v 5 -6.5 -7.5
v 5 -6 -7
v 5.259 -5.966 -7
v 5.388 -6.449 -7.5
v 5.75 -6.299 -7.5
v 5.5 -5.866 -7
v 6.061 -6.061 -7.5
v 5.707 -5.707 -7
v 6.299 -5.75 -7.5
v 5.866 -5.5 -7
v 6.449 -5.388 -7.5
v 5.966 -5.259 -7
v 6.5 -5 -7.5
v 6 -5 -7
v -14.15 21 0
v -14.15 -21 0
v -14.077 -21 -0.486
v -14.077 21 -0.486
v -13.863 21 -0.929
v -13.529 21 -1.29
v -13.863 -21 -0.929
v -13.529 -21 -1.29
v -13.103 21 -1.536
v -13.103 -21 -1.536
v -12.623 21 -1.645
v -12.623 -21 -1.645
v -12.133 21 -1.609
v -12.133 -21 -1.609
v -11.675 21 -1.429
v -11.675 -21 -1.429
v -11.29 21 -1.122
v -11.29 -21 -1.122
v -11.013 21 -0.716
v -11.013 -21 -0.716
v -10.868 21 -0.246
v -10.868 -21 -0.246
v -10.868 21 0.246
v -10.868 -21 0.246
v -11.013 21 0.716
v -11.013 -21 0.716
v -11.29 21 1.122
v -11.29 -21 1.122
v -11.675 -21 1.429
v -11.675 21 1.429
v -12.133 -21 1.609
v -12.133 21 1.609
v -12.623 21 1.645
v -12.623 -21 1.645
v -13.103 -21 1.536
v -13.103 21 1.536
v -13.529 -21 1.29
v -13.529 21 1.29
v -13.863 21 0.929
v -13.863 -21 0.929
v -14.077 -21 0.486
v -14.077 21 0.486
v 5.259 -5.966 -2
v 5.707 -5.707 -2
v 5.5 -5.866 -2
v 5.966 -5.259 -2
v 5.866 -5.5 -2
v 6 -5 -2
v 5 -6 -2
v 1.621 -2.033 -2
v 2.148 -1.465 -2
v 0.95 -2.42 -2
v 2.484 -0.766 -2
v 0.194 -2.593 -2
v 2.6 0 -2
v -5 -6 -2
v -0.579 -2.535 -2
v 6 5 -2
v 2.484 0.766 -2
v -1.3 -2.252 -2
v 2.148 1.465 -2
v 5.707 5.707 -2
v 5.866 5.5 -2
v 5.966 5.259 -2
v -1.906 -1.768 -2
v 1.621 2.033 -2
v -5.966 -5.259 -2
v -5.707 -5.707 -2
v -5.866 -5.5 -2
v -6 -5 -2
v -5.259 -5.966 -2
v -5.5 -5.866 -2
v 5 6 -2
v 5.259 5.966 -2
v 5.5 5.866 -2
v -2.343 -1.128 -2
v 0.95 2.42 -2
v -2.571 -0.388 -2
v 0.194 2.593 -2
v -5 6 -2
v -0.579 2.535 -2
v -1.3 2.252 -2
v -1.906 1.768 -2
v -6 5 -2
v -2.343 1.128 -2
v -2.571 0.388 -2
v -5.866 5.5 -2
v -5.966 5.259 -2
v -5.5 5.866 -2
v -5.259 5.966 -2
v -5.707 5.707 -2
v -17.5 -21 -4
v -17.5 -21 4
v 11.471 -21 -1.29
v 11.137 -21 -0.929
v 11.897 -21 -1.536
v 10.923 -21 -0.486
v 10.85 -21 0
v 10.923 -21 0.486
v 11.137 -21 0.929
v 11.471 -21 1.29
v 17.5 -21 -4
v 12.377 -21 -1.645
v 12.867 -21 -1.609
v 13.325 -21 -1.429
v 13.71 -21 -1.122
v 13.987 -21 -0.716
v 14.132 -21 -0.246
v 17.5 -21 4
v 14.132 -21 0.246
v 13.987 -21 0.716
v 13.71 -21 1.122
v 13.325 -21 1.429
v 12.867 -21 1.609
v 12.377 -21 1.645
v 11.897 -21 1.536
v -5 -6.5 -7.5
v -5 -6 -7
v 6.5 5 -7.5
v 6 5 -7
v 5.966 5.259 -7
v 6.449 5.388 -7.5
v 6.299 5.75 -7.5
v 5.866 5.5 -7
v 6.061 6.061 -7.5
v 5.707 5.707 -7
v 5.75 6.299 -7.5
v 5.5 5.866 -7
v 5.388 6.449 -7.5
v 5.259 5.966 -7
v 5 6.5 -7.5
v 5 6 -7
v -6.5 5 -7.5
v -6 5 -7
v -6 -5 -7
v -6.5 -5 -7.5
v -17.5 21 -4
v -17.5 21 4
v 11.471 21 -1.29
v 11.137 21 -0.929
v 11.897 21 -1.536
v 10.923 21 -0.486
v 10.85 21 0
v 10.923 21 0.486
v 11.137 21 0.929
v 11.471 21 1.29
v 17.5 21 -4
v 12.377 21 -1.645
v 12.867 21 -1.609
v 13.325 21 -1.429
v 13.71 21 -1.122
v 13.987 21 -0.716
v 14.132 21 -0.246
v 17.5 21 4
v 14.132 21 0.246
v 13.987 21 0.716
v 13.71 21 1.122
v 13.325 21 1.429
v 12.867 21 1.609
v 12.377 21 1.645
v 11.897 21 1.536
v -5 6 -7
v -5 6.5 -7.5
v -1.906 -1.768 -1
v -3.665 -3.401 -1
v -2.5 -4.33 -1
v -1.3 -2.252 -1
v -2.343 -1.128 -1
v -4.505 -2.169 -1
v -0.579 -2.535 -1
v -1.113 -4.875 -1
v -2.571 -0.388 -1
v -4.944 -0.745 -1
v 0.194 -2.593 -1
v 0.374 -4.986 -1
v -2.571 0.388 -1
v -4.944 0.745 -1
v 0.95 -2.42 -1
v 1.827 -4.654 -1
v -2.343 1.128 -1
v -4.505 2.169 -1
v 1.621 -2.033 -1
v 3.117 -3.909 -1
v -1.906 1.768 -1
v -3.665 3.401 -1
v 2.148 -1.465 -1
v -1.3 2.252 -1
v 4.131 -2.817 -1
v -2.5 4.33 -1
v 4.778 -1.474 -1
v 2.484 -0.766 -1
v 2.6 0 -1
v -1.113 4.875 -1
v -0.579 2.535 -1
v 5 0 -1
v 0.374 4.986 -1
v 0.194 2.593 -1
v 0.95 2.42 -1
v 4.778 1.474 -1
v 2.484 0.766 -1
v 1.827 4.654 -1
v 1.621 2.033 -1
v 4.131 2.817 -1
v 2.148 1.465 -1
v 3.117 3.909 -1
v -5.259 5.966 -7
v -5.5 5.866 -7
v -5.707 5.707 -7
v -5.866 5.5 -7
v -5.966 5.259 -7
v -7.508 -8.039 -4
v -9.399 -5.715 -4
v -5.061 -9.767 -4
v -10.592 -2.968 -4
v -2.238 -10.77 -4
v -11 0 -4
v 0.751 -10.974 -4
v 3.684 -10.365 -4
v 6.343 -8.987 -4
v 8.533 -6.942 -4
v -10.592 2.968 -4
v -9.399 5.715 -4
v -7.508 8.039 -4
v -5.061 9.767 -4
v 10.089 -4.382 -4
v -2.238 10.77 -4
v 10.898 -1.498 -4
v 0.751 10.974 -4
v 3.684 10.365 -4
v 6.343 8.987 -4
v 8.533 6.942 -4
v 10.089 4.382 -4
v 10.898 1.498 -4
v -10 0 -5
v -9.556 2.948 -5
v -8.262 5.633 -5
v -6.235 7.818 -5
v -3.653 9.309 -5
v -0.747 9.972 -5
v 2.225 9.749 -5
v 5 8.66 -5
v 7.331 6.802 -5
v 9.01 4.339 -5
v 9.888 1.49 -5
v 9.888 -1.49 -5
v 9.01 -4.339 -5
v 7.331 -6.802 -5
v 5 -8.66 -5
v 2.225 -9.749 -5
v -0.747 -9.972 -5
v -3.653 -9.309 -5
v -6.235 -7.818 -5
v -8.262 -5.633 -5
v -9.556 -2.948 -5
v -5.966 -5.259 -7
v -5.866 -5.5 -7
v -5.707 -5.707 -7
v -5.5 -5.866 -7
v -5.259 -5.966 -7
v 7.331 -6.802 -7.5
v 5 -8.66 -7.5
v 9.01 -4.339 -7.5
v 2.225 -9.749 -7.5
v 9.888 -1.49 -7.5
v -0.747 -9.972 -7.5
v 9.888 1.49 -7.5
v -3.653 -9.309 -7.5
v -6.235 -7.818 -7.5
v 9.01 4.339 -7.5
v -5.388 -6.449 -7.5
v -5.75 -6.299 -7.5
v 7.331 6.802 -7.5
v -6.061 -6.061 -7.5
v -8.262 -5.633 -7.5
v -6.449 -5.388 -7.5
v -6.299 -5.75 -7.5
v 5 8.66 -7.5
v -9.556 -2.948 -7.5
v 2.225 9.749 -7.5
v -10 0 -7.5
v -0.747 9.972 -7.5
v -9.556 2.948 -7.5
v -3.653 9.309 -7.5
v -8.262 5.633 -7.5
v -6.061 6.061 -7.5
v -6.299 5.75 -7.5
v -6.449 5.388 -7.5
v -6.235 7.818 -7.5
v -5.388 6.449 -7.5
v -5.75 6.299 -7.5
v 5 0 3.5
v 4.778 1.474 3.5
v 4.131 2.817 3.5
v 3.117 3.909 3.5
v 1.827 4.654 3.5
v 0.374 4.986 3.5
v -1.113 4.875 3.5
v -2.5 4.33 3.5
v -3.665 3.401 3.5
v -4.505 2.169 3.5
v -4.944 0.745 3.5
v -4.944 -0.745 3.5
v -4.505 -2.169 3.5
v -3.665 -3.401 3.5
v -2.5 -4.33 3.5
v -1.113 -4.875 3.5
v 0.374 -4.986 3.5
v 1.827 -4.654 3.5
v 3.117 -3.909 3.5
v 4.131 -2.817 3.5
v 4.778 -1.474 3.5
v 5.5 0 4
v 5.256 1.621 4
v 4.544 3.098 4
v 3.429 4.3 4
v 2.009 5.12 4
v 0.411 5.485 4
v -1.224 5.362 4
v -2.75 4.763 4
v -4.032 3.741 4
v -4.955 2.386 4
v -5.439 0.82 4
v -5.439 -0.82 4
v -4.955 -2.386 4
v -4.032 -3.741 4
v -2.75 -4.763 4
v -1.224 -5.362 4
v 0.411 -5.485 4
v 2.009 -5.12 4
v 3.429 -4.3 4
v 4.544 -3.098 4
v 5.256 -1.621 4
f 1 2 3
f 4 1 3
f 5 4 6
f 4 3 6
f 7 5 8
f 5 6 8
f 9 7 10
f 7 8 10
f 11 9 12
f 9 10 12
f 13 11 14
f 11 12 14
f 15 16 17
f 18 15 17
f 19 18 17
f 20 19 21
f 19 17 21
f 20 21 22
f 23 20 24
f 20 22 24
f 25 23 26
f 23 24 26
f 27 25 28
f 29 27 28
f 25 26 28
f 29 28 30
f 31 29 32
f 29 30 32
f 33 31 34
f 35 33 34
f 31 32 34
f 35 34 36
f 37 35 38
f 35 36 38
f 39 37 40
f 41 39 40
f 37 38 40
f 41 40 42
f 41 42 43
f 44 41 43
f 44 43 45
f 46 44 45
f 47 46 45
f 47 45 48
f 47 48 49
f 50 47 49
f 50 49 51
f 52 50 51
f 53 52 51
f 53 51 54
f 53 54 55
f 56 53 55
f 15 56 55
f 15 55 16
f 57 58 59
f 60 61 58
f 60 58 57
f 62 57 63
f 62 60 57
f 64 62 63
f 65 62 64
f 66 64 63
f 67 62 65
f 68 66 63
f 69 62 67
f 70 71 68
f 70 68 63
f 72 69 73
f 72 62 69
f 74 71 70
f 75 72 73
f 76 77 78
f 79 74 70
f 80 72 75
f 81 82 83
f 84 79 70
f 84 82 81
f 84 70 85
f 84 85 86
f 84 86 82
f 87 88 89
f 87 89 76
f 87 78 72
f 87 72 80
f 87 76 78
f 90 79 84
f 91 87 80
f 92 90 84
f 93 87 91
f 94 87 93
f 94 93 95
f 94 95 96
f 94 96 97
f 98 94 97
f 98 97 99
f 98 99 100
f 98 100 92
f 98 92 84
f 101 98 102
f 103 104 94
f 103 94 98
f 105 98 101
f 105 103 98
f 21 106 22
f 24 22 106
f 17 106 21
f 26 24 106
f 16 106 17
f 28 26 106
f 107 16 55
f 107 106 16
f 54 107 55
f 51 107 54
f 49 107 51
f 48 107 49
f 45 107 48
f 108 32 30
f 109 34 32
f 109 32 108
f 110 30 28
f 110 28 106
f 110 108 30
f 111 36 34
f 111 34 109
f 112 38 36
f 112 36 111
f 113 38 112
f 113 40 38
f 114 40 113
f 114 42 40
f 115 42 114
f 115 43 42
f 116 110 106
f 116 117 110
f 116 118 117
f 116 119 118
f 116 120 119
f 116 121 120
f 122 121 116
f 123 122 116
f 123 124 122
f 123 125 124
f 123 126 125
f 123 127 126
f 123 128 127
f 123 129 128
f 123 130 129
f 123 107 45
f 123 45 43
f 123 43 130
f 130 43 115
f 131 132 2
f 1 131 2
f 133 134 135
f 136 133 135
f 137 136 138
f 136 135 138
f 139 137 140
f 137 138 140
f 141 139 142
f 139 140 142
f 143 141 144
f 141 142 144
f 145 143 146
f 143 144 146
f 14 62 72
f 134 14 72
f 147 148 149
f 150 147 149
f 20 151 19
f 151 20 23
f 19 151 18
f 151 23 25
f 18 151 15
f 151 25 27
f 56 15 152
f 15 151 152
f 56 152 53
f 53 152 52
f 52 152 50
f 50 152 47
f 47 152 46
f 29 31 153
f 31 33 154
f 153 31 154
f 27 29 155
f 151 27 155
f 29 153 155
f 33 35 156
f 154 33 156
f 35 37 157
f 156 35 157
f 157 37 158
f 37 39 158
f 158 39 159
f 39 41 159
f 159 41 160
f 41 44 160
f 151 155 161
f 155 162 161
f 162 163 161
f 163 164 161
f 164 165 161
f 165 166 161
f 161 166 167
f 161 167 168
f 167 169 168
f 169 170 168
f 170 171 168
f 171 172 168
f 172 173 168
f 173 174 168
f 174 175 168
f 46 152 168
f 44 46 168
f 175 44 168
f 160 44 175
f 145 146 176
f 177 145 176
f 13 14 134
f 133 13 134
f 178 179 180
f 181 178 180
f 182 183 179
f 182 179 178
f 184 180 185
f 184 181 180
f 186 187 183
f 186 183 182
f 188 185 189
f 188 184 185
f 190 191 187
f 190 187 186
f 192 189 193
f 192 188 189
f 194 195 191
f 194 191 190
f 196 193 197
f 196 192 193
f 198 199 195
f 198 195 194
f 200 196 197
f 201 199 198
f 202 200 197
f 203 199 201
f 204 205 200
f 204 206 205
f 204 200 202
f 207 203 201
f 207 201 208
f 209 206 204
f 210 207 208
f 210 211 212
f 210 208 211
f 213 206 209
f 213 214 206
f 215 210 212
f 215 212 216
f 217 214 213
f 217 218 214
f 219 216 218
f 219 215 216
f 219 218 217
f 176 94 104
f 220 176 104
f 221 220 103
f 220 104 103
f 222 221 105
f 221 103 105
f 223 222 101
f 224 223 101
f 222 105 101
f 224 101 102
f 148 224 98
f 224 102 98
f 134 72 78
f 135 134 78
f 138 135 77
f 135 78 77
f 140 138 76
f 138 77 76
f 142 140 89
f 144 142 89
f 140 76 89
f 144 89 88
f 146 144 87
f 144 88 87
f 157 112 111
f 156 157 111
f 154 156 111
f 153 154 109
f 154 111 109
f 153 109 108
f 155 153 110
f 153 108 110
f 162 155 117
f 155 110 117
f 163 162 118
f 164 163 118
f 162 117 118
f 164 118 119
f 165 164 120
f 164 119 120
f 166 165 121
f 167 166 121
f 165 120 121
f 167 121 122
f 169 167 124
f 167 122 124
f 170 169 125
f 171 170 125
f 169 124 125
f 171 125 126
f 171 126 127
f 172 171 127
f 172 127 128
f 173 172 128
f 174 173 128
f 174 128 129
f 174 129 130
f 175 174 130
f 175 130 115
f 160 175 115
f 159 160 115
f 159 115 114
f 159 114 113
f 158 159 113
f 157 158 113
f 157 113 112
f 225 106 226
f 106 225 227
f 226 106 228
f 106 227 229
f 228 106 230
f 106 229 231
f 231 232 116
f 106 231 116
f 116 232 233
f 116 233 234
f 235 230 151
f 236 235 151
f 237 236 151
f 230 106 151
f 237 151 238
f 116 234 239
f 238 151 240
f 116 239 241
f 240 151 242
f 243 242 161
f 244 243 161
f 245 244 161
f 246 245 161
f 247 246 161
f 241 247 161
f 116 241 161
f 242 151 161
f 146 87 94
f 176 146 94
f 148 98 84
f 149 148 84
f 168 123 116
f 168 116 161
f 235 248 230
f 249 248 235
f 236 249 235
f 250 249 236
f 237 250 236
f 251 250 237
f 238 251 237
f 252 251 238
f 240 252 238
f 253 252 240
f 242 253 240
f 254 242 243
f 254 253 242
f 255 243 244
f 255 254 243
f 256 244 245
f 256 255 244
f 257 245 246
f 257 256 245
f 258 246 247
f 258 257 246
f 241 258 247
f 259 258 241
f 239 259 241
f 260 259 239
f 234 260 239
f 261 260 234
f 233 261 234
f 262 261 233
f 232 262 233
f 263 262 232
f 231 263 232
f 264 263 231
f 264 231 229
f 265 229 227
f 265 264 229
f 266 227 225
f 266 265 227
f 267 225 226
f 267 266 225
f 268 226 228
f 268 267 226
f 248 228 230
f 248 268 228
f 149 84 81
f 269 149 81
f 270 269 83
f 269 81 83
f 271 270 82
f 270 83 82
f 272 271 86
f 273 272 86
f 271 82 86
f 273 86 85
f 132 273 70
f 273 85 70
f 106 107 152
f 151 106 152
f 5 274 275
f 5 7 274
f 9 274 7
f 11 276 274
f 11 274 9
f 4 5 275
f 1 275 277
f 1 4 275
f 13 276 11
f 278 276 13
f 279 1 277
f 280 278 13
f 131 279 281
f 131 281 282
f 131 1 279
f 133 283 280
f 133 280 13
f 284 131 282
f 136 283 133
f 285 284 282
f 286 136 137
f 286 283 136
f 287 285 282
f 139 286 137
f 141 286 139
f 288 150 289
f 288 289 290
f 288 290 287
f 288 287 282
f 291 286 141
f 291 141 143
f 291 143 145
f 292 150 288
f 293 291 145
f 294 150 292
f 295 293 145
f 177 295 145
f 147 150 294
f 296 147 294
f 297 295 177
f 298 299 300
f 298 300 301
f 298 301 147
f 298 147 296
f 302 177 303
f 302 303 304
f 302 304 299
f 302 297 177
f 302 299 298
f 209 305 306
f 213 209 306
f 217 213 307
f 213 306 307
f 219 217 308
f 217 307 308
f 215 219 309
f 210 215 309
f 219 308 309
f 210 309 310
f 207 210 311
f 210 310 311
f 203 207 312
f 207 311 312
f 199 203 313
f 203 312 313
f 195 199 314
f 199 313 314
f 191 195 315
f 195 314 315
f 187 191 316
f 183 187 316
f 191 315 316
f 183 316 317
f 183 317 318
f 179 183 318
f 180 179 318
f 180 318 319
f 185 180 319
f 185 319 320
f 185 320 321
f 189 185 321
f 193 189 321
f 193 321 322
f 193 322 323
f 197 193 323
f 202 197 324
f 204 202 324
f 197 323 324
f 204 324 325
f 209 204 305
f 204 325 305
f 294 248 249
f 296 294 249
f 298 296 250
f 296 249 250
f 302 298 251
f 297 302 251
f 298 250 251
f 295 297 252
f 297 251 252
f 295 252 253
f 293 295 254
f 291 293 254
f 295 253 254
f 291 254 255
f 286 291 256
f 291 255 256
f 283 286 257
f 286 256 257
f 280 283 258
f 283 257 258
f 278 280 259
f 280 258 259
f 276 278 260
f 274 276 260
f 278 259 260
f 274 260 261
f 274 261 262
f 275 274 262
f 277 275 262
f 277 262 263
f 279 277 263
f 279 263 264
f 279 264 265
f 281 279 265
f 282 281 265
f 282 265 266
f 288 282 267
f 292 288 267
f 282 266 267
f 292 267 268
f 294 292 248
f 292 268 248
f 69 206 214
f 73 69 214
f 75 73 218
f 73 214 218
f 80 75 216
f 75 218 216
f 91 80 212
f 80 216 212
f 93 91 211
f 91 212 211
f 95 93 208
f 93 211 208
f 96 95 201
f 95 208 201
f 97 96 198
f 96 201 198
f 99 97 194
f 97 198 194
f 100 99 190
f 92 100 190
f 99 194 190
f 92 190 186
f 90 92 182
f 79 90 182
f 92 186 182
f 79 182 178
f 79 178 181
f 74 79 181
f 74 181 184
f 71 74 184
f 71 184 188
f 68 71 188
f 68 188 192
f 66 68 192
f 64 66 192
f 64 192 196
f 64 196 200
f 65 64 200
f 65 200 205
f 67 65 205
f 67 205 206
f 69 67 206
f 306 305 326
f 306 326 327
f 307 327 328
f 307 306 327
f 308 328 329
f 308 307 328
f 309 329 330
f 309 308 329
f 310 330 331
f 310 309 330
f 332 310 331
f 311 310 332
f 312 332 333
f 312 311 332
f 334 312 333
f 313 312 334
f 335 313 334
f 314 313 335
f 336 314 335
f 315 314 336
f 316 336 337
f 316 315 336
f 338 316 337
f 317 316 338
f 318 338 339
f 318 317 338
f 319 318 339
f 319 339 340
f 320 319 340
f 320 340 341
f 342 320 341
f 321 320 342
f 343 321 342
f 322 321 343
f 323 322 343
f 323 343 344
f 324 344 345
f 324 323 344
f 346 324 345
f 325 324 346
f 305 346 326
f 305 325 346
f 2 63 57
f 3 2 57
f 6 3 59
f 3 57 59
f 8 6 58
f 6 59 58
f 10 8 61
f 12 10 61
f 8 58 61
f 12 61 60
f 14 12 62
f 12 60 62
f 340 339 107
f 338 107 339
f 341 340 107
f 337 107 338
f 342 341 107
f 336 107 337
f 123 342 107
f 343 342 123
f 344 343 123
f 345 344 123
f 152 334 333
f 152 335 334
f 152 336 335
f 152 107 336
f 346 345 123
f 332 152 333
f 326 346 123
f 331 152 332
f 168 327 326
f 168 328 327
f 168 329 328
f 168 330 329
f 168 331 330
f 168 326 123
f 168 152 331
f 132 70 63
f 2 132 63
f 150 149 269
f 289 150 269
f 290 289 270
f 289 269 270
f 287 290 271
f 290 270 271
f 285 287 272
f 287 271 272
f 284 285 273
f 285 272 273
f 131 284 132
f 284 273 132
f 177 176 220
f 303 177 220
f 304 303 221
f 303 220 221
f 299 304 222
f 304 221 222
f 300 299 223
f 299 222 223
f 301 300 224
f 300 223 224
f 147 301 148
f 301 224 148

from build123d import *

# Parameters (mm, degrees)
SKETCH_1_W          = 35
SKETCH_1_H          = 42
EXTRUDE_1_DEPTH     = 4
SKETCH_4_R          = 10
EXTRUDE_2_DEPTH     = 3.5
CUT_EXTRUDE_2_DEPTH = 2
SKETCH_6_R          = 2.6
CUT_EXTRUDE_3_DEPTH = 12.5
SKETCH_7_R          = 5
CUT_EXTRUDE_4_DEPTH = 5
CHAMFER_1_SIZE      = 0.5
CHAMFER_2_SIZE      = 0.5
CHAMFER_3_SIZE      = 1
HOLE_WIZARD_M4_1_D  = 3.3


with BuildPart() as part:
    # 草图1 → 凸台-拉伸1 (new body, symmetric)
    with BuildSketch(Plane.XY):
        Rectangle(SKETCH_1_W, SKETCH_1_H)
    extrude(amount=EXTRUDE_1_DEPTH, both=True)

    # 草图4 → 凸台-拉伸2 (add)
    with BuildSketch(Plane(origin=(0, 0, -4), x_dir=(-1, 0, 0), z_dir=(0, 0, -1))):
        Circle(SKETCH_4_R)
        with BuildLine():
            Line((-5, 6), (5, 6))
            ThreePointArc((5, 6), (5.707106781, 5.707106781), (6, 5))
            Line((6, 5), (6, -5))
            ThreePointArc((6, -5), (5.707106781, -5.707106781), (5, -6))
            Line((5, -6), (-5, -6))
            ThreePointArc((-5, -6), (-5.707106781, -5.707106781), (-6, -5))
            Line((-6, -5), (-6, 5))
            ThreePointArc((-6, 5), (-5.707106781, 5.707106781), (-5, 6))
        make_face(mode=Mode.SUBTRACT)
    extrude(amount=EXTRUDE_2_DEPTH)

    # 草图5 → 切除-拉伸2 (cut)
    with BuildSketch(Plane(origin=(0, 0, -4), x_dir=(-1, 0, 0), z_dir=(0, 0, -1))):
        with BuildLine():
            Line((6, -5), (6, 5))
            ThreePointArc((6, 5), (5.707106781, 5.707106781), (5, 6))
            Line((5, 6), (-5, 6))
            ThreePointArc((-5, 6), (-5.707106781, 5.707106781), (-6, 5))
            Line((-6, 5), (-6, -5))
            ThreePointArc((-6, -5), (-5.707106781, -5.707106781), (-5, -6))
            Line((-5, -6), (5, -6))
            ThreePointArc((5, -6), (5.707106781, -5.707106781), (6, -5))
        make_face()
    extrude(amount=-CUT_EXTRUDE_2_DEPTH, mode=Mode.SUBTRACT)

    # 草图6 → 切除-拉伸3 (cut, through all)
    with BuildSketch(Plane.XY.offset(4)):
        Circle(SKETCH_6_R)
    extrude(amount=-CUT_EXTRUDE_3_DEPTH, mode=Mode.SUBTRACT)

    # 草图7 → 切除-拉伸4 (cut)
    with BuildSketch(Plane.XY.offset(4)):
        Circle(SKETCH_7_R)
    extrude(amount=-CUT_EXTRUDE_4_DEPTH, mode=Mode.SUBTRACT)

    # 倒角1
    chamfer_1_edges = [part.edges().sort_by_distance(p)[0] for p in [
        (-5.707106781, 5.707106781, -7.5),
        (0, 6, -7.5),
        (5.707106781, 5.707106781, -7.5),
        (6, 0, -7.5),
        (5.707106781, -5.707106781, -7.5),
        (0, -6, -7.5),
        (-5.707106781, -5.707106781, -7.5),
        (-6, 0, -7.5),
    ]]
    chamfer(chamfer_1_edges, length=CHAMFER_1_SIZE)

    # 倒角2
    chamfer_2_edges = [part.edges().sort_by_distance(p)[0] for p in [
        (-5, 0, 4),
    ]]
    chamfer(chamfer_2_edges, length=CHAMFER_2_SIZE)

    # 倒角3
    chamfer_3_edges = [part.edges().sort_by_distance(p)[0] for p in [
        (10, 0, -4),
    ]]
    chamfer(chamfer_3_edges, length=CHAMFER_3_SIZE)

    # M4 螺纹孔1 (through all)
    with Locations(Plane(origin=(0, 21, 0), x_dir=(1, 0, 0), z_dir=(0, 1, 0))):
        with Locations((-12.5, 0), (12.5, 0)):
            Hole(HOLE_WIZARD_M4_1_D / 2)


solid = part.part
